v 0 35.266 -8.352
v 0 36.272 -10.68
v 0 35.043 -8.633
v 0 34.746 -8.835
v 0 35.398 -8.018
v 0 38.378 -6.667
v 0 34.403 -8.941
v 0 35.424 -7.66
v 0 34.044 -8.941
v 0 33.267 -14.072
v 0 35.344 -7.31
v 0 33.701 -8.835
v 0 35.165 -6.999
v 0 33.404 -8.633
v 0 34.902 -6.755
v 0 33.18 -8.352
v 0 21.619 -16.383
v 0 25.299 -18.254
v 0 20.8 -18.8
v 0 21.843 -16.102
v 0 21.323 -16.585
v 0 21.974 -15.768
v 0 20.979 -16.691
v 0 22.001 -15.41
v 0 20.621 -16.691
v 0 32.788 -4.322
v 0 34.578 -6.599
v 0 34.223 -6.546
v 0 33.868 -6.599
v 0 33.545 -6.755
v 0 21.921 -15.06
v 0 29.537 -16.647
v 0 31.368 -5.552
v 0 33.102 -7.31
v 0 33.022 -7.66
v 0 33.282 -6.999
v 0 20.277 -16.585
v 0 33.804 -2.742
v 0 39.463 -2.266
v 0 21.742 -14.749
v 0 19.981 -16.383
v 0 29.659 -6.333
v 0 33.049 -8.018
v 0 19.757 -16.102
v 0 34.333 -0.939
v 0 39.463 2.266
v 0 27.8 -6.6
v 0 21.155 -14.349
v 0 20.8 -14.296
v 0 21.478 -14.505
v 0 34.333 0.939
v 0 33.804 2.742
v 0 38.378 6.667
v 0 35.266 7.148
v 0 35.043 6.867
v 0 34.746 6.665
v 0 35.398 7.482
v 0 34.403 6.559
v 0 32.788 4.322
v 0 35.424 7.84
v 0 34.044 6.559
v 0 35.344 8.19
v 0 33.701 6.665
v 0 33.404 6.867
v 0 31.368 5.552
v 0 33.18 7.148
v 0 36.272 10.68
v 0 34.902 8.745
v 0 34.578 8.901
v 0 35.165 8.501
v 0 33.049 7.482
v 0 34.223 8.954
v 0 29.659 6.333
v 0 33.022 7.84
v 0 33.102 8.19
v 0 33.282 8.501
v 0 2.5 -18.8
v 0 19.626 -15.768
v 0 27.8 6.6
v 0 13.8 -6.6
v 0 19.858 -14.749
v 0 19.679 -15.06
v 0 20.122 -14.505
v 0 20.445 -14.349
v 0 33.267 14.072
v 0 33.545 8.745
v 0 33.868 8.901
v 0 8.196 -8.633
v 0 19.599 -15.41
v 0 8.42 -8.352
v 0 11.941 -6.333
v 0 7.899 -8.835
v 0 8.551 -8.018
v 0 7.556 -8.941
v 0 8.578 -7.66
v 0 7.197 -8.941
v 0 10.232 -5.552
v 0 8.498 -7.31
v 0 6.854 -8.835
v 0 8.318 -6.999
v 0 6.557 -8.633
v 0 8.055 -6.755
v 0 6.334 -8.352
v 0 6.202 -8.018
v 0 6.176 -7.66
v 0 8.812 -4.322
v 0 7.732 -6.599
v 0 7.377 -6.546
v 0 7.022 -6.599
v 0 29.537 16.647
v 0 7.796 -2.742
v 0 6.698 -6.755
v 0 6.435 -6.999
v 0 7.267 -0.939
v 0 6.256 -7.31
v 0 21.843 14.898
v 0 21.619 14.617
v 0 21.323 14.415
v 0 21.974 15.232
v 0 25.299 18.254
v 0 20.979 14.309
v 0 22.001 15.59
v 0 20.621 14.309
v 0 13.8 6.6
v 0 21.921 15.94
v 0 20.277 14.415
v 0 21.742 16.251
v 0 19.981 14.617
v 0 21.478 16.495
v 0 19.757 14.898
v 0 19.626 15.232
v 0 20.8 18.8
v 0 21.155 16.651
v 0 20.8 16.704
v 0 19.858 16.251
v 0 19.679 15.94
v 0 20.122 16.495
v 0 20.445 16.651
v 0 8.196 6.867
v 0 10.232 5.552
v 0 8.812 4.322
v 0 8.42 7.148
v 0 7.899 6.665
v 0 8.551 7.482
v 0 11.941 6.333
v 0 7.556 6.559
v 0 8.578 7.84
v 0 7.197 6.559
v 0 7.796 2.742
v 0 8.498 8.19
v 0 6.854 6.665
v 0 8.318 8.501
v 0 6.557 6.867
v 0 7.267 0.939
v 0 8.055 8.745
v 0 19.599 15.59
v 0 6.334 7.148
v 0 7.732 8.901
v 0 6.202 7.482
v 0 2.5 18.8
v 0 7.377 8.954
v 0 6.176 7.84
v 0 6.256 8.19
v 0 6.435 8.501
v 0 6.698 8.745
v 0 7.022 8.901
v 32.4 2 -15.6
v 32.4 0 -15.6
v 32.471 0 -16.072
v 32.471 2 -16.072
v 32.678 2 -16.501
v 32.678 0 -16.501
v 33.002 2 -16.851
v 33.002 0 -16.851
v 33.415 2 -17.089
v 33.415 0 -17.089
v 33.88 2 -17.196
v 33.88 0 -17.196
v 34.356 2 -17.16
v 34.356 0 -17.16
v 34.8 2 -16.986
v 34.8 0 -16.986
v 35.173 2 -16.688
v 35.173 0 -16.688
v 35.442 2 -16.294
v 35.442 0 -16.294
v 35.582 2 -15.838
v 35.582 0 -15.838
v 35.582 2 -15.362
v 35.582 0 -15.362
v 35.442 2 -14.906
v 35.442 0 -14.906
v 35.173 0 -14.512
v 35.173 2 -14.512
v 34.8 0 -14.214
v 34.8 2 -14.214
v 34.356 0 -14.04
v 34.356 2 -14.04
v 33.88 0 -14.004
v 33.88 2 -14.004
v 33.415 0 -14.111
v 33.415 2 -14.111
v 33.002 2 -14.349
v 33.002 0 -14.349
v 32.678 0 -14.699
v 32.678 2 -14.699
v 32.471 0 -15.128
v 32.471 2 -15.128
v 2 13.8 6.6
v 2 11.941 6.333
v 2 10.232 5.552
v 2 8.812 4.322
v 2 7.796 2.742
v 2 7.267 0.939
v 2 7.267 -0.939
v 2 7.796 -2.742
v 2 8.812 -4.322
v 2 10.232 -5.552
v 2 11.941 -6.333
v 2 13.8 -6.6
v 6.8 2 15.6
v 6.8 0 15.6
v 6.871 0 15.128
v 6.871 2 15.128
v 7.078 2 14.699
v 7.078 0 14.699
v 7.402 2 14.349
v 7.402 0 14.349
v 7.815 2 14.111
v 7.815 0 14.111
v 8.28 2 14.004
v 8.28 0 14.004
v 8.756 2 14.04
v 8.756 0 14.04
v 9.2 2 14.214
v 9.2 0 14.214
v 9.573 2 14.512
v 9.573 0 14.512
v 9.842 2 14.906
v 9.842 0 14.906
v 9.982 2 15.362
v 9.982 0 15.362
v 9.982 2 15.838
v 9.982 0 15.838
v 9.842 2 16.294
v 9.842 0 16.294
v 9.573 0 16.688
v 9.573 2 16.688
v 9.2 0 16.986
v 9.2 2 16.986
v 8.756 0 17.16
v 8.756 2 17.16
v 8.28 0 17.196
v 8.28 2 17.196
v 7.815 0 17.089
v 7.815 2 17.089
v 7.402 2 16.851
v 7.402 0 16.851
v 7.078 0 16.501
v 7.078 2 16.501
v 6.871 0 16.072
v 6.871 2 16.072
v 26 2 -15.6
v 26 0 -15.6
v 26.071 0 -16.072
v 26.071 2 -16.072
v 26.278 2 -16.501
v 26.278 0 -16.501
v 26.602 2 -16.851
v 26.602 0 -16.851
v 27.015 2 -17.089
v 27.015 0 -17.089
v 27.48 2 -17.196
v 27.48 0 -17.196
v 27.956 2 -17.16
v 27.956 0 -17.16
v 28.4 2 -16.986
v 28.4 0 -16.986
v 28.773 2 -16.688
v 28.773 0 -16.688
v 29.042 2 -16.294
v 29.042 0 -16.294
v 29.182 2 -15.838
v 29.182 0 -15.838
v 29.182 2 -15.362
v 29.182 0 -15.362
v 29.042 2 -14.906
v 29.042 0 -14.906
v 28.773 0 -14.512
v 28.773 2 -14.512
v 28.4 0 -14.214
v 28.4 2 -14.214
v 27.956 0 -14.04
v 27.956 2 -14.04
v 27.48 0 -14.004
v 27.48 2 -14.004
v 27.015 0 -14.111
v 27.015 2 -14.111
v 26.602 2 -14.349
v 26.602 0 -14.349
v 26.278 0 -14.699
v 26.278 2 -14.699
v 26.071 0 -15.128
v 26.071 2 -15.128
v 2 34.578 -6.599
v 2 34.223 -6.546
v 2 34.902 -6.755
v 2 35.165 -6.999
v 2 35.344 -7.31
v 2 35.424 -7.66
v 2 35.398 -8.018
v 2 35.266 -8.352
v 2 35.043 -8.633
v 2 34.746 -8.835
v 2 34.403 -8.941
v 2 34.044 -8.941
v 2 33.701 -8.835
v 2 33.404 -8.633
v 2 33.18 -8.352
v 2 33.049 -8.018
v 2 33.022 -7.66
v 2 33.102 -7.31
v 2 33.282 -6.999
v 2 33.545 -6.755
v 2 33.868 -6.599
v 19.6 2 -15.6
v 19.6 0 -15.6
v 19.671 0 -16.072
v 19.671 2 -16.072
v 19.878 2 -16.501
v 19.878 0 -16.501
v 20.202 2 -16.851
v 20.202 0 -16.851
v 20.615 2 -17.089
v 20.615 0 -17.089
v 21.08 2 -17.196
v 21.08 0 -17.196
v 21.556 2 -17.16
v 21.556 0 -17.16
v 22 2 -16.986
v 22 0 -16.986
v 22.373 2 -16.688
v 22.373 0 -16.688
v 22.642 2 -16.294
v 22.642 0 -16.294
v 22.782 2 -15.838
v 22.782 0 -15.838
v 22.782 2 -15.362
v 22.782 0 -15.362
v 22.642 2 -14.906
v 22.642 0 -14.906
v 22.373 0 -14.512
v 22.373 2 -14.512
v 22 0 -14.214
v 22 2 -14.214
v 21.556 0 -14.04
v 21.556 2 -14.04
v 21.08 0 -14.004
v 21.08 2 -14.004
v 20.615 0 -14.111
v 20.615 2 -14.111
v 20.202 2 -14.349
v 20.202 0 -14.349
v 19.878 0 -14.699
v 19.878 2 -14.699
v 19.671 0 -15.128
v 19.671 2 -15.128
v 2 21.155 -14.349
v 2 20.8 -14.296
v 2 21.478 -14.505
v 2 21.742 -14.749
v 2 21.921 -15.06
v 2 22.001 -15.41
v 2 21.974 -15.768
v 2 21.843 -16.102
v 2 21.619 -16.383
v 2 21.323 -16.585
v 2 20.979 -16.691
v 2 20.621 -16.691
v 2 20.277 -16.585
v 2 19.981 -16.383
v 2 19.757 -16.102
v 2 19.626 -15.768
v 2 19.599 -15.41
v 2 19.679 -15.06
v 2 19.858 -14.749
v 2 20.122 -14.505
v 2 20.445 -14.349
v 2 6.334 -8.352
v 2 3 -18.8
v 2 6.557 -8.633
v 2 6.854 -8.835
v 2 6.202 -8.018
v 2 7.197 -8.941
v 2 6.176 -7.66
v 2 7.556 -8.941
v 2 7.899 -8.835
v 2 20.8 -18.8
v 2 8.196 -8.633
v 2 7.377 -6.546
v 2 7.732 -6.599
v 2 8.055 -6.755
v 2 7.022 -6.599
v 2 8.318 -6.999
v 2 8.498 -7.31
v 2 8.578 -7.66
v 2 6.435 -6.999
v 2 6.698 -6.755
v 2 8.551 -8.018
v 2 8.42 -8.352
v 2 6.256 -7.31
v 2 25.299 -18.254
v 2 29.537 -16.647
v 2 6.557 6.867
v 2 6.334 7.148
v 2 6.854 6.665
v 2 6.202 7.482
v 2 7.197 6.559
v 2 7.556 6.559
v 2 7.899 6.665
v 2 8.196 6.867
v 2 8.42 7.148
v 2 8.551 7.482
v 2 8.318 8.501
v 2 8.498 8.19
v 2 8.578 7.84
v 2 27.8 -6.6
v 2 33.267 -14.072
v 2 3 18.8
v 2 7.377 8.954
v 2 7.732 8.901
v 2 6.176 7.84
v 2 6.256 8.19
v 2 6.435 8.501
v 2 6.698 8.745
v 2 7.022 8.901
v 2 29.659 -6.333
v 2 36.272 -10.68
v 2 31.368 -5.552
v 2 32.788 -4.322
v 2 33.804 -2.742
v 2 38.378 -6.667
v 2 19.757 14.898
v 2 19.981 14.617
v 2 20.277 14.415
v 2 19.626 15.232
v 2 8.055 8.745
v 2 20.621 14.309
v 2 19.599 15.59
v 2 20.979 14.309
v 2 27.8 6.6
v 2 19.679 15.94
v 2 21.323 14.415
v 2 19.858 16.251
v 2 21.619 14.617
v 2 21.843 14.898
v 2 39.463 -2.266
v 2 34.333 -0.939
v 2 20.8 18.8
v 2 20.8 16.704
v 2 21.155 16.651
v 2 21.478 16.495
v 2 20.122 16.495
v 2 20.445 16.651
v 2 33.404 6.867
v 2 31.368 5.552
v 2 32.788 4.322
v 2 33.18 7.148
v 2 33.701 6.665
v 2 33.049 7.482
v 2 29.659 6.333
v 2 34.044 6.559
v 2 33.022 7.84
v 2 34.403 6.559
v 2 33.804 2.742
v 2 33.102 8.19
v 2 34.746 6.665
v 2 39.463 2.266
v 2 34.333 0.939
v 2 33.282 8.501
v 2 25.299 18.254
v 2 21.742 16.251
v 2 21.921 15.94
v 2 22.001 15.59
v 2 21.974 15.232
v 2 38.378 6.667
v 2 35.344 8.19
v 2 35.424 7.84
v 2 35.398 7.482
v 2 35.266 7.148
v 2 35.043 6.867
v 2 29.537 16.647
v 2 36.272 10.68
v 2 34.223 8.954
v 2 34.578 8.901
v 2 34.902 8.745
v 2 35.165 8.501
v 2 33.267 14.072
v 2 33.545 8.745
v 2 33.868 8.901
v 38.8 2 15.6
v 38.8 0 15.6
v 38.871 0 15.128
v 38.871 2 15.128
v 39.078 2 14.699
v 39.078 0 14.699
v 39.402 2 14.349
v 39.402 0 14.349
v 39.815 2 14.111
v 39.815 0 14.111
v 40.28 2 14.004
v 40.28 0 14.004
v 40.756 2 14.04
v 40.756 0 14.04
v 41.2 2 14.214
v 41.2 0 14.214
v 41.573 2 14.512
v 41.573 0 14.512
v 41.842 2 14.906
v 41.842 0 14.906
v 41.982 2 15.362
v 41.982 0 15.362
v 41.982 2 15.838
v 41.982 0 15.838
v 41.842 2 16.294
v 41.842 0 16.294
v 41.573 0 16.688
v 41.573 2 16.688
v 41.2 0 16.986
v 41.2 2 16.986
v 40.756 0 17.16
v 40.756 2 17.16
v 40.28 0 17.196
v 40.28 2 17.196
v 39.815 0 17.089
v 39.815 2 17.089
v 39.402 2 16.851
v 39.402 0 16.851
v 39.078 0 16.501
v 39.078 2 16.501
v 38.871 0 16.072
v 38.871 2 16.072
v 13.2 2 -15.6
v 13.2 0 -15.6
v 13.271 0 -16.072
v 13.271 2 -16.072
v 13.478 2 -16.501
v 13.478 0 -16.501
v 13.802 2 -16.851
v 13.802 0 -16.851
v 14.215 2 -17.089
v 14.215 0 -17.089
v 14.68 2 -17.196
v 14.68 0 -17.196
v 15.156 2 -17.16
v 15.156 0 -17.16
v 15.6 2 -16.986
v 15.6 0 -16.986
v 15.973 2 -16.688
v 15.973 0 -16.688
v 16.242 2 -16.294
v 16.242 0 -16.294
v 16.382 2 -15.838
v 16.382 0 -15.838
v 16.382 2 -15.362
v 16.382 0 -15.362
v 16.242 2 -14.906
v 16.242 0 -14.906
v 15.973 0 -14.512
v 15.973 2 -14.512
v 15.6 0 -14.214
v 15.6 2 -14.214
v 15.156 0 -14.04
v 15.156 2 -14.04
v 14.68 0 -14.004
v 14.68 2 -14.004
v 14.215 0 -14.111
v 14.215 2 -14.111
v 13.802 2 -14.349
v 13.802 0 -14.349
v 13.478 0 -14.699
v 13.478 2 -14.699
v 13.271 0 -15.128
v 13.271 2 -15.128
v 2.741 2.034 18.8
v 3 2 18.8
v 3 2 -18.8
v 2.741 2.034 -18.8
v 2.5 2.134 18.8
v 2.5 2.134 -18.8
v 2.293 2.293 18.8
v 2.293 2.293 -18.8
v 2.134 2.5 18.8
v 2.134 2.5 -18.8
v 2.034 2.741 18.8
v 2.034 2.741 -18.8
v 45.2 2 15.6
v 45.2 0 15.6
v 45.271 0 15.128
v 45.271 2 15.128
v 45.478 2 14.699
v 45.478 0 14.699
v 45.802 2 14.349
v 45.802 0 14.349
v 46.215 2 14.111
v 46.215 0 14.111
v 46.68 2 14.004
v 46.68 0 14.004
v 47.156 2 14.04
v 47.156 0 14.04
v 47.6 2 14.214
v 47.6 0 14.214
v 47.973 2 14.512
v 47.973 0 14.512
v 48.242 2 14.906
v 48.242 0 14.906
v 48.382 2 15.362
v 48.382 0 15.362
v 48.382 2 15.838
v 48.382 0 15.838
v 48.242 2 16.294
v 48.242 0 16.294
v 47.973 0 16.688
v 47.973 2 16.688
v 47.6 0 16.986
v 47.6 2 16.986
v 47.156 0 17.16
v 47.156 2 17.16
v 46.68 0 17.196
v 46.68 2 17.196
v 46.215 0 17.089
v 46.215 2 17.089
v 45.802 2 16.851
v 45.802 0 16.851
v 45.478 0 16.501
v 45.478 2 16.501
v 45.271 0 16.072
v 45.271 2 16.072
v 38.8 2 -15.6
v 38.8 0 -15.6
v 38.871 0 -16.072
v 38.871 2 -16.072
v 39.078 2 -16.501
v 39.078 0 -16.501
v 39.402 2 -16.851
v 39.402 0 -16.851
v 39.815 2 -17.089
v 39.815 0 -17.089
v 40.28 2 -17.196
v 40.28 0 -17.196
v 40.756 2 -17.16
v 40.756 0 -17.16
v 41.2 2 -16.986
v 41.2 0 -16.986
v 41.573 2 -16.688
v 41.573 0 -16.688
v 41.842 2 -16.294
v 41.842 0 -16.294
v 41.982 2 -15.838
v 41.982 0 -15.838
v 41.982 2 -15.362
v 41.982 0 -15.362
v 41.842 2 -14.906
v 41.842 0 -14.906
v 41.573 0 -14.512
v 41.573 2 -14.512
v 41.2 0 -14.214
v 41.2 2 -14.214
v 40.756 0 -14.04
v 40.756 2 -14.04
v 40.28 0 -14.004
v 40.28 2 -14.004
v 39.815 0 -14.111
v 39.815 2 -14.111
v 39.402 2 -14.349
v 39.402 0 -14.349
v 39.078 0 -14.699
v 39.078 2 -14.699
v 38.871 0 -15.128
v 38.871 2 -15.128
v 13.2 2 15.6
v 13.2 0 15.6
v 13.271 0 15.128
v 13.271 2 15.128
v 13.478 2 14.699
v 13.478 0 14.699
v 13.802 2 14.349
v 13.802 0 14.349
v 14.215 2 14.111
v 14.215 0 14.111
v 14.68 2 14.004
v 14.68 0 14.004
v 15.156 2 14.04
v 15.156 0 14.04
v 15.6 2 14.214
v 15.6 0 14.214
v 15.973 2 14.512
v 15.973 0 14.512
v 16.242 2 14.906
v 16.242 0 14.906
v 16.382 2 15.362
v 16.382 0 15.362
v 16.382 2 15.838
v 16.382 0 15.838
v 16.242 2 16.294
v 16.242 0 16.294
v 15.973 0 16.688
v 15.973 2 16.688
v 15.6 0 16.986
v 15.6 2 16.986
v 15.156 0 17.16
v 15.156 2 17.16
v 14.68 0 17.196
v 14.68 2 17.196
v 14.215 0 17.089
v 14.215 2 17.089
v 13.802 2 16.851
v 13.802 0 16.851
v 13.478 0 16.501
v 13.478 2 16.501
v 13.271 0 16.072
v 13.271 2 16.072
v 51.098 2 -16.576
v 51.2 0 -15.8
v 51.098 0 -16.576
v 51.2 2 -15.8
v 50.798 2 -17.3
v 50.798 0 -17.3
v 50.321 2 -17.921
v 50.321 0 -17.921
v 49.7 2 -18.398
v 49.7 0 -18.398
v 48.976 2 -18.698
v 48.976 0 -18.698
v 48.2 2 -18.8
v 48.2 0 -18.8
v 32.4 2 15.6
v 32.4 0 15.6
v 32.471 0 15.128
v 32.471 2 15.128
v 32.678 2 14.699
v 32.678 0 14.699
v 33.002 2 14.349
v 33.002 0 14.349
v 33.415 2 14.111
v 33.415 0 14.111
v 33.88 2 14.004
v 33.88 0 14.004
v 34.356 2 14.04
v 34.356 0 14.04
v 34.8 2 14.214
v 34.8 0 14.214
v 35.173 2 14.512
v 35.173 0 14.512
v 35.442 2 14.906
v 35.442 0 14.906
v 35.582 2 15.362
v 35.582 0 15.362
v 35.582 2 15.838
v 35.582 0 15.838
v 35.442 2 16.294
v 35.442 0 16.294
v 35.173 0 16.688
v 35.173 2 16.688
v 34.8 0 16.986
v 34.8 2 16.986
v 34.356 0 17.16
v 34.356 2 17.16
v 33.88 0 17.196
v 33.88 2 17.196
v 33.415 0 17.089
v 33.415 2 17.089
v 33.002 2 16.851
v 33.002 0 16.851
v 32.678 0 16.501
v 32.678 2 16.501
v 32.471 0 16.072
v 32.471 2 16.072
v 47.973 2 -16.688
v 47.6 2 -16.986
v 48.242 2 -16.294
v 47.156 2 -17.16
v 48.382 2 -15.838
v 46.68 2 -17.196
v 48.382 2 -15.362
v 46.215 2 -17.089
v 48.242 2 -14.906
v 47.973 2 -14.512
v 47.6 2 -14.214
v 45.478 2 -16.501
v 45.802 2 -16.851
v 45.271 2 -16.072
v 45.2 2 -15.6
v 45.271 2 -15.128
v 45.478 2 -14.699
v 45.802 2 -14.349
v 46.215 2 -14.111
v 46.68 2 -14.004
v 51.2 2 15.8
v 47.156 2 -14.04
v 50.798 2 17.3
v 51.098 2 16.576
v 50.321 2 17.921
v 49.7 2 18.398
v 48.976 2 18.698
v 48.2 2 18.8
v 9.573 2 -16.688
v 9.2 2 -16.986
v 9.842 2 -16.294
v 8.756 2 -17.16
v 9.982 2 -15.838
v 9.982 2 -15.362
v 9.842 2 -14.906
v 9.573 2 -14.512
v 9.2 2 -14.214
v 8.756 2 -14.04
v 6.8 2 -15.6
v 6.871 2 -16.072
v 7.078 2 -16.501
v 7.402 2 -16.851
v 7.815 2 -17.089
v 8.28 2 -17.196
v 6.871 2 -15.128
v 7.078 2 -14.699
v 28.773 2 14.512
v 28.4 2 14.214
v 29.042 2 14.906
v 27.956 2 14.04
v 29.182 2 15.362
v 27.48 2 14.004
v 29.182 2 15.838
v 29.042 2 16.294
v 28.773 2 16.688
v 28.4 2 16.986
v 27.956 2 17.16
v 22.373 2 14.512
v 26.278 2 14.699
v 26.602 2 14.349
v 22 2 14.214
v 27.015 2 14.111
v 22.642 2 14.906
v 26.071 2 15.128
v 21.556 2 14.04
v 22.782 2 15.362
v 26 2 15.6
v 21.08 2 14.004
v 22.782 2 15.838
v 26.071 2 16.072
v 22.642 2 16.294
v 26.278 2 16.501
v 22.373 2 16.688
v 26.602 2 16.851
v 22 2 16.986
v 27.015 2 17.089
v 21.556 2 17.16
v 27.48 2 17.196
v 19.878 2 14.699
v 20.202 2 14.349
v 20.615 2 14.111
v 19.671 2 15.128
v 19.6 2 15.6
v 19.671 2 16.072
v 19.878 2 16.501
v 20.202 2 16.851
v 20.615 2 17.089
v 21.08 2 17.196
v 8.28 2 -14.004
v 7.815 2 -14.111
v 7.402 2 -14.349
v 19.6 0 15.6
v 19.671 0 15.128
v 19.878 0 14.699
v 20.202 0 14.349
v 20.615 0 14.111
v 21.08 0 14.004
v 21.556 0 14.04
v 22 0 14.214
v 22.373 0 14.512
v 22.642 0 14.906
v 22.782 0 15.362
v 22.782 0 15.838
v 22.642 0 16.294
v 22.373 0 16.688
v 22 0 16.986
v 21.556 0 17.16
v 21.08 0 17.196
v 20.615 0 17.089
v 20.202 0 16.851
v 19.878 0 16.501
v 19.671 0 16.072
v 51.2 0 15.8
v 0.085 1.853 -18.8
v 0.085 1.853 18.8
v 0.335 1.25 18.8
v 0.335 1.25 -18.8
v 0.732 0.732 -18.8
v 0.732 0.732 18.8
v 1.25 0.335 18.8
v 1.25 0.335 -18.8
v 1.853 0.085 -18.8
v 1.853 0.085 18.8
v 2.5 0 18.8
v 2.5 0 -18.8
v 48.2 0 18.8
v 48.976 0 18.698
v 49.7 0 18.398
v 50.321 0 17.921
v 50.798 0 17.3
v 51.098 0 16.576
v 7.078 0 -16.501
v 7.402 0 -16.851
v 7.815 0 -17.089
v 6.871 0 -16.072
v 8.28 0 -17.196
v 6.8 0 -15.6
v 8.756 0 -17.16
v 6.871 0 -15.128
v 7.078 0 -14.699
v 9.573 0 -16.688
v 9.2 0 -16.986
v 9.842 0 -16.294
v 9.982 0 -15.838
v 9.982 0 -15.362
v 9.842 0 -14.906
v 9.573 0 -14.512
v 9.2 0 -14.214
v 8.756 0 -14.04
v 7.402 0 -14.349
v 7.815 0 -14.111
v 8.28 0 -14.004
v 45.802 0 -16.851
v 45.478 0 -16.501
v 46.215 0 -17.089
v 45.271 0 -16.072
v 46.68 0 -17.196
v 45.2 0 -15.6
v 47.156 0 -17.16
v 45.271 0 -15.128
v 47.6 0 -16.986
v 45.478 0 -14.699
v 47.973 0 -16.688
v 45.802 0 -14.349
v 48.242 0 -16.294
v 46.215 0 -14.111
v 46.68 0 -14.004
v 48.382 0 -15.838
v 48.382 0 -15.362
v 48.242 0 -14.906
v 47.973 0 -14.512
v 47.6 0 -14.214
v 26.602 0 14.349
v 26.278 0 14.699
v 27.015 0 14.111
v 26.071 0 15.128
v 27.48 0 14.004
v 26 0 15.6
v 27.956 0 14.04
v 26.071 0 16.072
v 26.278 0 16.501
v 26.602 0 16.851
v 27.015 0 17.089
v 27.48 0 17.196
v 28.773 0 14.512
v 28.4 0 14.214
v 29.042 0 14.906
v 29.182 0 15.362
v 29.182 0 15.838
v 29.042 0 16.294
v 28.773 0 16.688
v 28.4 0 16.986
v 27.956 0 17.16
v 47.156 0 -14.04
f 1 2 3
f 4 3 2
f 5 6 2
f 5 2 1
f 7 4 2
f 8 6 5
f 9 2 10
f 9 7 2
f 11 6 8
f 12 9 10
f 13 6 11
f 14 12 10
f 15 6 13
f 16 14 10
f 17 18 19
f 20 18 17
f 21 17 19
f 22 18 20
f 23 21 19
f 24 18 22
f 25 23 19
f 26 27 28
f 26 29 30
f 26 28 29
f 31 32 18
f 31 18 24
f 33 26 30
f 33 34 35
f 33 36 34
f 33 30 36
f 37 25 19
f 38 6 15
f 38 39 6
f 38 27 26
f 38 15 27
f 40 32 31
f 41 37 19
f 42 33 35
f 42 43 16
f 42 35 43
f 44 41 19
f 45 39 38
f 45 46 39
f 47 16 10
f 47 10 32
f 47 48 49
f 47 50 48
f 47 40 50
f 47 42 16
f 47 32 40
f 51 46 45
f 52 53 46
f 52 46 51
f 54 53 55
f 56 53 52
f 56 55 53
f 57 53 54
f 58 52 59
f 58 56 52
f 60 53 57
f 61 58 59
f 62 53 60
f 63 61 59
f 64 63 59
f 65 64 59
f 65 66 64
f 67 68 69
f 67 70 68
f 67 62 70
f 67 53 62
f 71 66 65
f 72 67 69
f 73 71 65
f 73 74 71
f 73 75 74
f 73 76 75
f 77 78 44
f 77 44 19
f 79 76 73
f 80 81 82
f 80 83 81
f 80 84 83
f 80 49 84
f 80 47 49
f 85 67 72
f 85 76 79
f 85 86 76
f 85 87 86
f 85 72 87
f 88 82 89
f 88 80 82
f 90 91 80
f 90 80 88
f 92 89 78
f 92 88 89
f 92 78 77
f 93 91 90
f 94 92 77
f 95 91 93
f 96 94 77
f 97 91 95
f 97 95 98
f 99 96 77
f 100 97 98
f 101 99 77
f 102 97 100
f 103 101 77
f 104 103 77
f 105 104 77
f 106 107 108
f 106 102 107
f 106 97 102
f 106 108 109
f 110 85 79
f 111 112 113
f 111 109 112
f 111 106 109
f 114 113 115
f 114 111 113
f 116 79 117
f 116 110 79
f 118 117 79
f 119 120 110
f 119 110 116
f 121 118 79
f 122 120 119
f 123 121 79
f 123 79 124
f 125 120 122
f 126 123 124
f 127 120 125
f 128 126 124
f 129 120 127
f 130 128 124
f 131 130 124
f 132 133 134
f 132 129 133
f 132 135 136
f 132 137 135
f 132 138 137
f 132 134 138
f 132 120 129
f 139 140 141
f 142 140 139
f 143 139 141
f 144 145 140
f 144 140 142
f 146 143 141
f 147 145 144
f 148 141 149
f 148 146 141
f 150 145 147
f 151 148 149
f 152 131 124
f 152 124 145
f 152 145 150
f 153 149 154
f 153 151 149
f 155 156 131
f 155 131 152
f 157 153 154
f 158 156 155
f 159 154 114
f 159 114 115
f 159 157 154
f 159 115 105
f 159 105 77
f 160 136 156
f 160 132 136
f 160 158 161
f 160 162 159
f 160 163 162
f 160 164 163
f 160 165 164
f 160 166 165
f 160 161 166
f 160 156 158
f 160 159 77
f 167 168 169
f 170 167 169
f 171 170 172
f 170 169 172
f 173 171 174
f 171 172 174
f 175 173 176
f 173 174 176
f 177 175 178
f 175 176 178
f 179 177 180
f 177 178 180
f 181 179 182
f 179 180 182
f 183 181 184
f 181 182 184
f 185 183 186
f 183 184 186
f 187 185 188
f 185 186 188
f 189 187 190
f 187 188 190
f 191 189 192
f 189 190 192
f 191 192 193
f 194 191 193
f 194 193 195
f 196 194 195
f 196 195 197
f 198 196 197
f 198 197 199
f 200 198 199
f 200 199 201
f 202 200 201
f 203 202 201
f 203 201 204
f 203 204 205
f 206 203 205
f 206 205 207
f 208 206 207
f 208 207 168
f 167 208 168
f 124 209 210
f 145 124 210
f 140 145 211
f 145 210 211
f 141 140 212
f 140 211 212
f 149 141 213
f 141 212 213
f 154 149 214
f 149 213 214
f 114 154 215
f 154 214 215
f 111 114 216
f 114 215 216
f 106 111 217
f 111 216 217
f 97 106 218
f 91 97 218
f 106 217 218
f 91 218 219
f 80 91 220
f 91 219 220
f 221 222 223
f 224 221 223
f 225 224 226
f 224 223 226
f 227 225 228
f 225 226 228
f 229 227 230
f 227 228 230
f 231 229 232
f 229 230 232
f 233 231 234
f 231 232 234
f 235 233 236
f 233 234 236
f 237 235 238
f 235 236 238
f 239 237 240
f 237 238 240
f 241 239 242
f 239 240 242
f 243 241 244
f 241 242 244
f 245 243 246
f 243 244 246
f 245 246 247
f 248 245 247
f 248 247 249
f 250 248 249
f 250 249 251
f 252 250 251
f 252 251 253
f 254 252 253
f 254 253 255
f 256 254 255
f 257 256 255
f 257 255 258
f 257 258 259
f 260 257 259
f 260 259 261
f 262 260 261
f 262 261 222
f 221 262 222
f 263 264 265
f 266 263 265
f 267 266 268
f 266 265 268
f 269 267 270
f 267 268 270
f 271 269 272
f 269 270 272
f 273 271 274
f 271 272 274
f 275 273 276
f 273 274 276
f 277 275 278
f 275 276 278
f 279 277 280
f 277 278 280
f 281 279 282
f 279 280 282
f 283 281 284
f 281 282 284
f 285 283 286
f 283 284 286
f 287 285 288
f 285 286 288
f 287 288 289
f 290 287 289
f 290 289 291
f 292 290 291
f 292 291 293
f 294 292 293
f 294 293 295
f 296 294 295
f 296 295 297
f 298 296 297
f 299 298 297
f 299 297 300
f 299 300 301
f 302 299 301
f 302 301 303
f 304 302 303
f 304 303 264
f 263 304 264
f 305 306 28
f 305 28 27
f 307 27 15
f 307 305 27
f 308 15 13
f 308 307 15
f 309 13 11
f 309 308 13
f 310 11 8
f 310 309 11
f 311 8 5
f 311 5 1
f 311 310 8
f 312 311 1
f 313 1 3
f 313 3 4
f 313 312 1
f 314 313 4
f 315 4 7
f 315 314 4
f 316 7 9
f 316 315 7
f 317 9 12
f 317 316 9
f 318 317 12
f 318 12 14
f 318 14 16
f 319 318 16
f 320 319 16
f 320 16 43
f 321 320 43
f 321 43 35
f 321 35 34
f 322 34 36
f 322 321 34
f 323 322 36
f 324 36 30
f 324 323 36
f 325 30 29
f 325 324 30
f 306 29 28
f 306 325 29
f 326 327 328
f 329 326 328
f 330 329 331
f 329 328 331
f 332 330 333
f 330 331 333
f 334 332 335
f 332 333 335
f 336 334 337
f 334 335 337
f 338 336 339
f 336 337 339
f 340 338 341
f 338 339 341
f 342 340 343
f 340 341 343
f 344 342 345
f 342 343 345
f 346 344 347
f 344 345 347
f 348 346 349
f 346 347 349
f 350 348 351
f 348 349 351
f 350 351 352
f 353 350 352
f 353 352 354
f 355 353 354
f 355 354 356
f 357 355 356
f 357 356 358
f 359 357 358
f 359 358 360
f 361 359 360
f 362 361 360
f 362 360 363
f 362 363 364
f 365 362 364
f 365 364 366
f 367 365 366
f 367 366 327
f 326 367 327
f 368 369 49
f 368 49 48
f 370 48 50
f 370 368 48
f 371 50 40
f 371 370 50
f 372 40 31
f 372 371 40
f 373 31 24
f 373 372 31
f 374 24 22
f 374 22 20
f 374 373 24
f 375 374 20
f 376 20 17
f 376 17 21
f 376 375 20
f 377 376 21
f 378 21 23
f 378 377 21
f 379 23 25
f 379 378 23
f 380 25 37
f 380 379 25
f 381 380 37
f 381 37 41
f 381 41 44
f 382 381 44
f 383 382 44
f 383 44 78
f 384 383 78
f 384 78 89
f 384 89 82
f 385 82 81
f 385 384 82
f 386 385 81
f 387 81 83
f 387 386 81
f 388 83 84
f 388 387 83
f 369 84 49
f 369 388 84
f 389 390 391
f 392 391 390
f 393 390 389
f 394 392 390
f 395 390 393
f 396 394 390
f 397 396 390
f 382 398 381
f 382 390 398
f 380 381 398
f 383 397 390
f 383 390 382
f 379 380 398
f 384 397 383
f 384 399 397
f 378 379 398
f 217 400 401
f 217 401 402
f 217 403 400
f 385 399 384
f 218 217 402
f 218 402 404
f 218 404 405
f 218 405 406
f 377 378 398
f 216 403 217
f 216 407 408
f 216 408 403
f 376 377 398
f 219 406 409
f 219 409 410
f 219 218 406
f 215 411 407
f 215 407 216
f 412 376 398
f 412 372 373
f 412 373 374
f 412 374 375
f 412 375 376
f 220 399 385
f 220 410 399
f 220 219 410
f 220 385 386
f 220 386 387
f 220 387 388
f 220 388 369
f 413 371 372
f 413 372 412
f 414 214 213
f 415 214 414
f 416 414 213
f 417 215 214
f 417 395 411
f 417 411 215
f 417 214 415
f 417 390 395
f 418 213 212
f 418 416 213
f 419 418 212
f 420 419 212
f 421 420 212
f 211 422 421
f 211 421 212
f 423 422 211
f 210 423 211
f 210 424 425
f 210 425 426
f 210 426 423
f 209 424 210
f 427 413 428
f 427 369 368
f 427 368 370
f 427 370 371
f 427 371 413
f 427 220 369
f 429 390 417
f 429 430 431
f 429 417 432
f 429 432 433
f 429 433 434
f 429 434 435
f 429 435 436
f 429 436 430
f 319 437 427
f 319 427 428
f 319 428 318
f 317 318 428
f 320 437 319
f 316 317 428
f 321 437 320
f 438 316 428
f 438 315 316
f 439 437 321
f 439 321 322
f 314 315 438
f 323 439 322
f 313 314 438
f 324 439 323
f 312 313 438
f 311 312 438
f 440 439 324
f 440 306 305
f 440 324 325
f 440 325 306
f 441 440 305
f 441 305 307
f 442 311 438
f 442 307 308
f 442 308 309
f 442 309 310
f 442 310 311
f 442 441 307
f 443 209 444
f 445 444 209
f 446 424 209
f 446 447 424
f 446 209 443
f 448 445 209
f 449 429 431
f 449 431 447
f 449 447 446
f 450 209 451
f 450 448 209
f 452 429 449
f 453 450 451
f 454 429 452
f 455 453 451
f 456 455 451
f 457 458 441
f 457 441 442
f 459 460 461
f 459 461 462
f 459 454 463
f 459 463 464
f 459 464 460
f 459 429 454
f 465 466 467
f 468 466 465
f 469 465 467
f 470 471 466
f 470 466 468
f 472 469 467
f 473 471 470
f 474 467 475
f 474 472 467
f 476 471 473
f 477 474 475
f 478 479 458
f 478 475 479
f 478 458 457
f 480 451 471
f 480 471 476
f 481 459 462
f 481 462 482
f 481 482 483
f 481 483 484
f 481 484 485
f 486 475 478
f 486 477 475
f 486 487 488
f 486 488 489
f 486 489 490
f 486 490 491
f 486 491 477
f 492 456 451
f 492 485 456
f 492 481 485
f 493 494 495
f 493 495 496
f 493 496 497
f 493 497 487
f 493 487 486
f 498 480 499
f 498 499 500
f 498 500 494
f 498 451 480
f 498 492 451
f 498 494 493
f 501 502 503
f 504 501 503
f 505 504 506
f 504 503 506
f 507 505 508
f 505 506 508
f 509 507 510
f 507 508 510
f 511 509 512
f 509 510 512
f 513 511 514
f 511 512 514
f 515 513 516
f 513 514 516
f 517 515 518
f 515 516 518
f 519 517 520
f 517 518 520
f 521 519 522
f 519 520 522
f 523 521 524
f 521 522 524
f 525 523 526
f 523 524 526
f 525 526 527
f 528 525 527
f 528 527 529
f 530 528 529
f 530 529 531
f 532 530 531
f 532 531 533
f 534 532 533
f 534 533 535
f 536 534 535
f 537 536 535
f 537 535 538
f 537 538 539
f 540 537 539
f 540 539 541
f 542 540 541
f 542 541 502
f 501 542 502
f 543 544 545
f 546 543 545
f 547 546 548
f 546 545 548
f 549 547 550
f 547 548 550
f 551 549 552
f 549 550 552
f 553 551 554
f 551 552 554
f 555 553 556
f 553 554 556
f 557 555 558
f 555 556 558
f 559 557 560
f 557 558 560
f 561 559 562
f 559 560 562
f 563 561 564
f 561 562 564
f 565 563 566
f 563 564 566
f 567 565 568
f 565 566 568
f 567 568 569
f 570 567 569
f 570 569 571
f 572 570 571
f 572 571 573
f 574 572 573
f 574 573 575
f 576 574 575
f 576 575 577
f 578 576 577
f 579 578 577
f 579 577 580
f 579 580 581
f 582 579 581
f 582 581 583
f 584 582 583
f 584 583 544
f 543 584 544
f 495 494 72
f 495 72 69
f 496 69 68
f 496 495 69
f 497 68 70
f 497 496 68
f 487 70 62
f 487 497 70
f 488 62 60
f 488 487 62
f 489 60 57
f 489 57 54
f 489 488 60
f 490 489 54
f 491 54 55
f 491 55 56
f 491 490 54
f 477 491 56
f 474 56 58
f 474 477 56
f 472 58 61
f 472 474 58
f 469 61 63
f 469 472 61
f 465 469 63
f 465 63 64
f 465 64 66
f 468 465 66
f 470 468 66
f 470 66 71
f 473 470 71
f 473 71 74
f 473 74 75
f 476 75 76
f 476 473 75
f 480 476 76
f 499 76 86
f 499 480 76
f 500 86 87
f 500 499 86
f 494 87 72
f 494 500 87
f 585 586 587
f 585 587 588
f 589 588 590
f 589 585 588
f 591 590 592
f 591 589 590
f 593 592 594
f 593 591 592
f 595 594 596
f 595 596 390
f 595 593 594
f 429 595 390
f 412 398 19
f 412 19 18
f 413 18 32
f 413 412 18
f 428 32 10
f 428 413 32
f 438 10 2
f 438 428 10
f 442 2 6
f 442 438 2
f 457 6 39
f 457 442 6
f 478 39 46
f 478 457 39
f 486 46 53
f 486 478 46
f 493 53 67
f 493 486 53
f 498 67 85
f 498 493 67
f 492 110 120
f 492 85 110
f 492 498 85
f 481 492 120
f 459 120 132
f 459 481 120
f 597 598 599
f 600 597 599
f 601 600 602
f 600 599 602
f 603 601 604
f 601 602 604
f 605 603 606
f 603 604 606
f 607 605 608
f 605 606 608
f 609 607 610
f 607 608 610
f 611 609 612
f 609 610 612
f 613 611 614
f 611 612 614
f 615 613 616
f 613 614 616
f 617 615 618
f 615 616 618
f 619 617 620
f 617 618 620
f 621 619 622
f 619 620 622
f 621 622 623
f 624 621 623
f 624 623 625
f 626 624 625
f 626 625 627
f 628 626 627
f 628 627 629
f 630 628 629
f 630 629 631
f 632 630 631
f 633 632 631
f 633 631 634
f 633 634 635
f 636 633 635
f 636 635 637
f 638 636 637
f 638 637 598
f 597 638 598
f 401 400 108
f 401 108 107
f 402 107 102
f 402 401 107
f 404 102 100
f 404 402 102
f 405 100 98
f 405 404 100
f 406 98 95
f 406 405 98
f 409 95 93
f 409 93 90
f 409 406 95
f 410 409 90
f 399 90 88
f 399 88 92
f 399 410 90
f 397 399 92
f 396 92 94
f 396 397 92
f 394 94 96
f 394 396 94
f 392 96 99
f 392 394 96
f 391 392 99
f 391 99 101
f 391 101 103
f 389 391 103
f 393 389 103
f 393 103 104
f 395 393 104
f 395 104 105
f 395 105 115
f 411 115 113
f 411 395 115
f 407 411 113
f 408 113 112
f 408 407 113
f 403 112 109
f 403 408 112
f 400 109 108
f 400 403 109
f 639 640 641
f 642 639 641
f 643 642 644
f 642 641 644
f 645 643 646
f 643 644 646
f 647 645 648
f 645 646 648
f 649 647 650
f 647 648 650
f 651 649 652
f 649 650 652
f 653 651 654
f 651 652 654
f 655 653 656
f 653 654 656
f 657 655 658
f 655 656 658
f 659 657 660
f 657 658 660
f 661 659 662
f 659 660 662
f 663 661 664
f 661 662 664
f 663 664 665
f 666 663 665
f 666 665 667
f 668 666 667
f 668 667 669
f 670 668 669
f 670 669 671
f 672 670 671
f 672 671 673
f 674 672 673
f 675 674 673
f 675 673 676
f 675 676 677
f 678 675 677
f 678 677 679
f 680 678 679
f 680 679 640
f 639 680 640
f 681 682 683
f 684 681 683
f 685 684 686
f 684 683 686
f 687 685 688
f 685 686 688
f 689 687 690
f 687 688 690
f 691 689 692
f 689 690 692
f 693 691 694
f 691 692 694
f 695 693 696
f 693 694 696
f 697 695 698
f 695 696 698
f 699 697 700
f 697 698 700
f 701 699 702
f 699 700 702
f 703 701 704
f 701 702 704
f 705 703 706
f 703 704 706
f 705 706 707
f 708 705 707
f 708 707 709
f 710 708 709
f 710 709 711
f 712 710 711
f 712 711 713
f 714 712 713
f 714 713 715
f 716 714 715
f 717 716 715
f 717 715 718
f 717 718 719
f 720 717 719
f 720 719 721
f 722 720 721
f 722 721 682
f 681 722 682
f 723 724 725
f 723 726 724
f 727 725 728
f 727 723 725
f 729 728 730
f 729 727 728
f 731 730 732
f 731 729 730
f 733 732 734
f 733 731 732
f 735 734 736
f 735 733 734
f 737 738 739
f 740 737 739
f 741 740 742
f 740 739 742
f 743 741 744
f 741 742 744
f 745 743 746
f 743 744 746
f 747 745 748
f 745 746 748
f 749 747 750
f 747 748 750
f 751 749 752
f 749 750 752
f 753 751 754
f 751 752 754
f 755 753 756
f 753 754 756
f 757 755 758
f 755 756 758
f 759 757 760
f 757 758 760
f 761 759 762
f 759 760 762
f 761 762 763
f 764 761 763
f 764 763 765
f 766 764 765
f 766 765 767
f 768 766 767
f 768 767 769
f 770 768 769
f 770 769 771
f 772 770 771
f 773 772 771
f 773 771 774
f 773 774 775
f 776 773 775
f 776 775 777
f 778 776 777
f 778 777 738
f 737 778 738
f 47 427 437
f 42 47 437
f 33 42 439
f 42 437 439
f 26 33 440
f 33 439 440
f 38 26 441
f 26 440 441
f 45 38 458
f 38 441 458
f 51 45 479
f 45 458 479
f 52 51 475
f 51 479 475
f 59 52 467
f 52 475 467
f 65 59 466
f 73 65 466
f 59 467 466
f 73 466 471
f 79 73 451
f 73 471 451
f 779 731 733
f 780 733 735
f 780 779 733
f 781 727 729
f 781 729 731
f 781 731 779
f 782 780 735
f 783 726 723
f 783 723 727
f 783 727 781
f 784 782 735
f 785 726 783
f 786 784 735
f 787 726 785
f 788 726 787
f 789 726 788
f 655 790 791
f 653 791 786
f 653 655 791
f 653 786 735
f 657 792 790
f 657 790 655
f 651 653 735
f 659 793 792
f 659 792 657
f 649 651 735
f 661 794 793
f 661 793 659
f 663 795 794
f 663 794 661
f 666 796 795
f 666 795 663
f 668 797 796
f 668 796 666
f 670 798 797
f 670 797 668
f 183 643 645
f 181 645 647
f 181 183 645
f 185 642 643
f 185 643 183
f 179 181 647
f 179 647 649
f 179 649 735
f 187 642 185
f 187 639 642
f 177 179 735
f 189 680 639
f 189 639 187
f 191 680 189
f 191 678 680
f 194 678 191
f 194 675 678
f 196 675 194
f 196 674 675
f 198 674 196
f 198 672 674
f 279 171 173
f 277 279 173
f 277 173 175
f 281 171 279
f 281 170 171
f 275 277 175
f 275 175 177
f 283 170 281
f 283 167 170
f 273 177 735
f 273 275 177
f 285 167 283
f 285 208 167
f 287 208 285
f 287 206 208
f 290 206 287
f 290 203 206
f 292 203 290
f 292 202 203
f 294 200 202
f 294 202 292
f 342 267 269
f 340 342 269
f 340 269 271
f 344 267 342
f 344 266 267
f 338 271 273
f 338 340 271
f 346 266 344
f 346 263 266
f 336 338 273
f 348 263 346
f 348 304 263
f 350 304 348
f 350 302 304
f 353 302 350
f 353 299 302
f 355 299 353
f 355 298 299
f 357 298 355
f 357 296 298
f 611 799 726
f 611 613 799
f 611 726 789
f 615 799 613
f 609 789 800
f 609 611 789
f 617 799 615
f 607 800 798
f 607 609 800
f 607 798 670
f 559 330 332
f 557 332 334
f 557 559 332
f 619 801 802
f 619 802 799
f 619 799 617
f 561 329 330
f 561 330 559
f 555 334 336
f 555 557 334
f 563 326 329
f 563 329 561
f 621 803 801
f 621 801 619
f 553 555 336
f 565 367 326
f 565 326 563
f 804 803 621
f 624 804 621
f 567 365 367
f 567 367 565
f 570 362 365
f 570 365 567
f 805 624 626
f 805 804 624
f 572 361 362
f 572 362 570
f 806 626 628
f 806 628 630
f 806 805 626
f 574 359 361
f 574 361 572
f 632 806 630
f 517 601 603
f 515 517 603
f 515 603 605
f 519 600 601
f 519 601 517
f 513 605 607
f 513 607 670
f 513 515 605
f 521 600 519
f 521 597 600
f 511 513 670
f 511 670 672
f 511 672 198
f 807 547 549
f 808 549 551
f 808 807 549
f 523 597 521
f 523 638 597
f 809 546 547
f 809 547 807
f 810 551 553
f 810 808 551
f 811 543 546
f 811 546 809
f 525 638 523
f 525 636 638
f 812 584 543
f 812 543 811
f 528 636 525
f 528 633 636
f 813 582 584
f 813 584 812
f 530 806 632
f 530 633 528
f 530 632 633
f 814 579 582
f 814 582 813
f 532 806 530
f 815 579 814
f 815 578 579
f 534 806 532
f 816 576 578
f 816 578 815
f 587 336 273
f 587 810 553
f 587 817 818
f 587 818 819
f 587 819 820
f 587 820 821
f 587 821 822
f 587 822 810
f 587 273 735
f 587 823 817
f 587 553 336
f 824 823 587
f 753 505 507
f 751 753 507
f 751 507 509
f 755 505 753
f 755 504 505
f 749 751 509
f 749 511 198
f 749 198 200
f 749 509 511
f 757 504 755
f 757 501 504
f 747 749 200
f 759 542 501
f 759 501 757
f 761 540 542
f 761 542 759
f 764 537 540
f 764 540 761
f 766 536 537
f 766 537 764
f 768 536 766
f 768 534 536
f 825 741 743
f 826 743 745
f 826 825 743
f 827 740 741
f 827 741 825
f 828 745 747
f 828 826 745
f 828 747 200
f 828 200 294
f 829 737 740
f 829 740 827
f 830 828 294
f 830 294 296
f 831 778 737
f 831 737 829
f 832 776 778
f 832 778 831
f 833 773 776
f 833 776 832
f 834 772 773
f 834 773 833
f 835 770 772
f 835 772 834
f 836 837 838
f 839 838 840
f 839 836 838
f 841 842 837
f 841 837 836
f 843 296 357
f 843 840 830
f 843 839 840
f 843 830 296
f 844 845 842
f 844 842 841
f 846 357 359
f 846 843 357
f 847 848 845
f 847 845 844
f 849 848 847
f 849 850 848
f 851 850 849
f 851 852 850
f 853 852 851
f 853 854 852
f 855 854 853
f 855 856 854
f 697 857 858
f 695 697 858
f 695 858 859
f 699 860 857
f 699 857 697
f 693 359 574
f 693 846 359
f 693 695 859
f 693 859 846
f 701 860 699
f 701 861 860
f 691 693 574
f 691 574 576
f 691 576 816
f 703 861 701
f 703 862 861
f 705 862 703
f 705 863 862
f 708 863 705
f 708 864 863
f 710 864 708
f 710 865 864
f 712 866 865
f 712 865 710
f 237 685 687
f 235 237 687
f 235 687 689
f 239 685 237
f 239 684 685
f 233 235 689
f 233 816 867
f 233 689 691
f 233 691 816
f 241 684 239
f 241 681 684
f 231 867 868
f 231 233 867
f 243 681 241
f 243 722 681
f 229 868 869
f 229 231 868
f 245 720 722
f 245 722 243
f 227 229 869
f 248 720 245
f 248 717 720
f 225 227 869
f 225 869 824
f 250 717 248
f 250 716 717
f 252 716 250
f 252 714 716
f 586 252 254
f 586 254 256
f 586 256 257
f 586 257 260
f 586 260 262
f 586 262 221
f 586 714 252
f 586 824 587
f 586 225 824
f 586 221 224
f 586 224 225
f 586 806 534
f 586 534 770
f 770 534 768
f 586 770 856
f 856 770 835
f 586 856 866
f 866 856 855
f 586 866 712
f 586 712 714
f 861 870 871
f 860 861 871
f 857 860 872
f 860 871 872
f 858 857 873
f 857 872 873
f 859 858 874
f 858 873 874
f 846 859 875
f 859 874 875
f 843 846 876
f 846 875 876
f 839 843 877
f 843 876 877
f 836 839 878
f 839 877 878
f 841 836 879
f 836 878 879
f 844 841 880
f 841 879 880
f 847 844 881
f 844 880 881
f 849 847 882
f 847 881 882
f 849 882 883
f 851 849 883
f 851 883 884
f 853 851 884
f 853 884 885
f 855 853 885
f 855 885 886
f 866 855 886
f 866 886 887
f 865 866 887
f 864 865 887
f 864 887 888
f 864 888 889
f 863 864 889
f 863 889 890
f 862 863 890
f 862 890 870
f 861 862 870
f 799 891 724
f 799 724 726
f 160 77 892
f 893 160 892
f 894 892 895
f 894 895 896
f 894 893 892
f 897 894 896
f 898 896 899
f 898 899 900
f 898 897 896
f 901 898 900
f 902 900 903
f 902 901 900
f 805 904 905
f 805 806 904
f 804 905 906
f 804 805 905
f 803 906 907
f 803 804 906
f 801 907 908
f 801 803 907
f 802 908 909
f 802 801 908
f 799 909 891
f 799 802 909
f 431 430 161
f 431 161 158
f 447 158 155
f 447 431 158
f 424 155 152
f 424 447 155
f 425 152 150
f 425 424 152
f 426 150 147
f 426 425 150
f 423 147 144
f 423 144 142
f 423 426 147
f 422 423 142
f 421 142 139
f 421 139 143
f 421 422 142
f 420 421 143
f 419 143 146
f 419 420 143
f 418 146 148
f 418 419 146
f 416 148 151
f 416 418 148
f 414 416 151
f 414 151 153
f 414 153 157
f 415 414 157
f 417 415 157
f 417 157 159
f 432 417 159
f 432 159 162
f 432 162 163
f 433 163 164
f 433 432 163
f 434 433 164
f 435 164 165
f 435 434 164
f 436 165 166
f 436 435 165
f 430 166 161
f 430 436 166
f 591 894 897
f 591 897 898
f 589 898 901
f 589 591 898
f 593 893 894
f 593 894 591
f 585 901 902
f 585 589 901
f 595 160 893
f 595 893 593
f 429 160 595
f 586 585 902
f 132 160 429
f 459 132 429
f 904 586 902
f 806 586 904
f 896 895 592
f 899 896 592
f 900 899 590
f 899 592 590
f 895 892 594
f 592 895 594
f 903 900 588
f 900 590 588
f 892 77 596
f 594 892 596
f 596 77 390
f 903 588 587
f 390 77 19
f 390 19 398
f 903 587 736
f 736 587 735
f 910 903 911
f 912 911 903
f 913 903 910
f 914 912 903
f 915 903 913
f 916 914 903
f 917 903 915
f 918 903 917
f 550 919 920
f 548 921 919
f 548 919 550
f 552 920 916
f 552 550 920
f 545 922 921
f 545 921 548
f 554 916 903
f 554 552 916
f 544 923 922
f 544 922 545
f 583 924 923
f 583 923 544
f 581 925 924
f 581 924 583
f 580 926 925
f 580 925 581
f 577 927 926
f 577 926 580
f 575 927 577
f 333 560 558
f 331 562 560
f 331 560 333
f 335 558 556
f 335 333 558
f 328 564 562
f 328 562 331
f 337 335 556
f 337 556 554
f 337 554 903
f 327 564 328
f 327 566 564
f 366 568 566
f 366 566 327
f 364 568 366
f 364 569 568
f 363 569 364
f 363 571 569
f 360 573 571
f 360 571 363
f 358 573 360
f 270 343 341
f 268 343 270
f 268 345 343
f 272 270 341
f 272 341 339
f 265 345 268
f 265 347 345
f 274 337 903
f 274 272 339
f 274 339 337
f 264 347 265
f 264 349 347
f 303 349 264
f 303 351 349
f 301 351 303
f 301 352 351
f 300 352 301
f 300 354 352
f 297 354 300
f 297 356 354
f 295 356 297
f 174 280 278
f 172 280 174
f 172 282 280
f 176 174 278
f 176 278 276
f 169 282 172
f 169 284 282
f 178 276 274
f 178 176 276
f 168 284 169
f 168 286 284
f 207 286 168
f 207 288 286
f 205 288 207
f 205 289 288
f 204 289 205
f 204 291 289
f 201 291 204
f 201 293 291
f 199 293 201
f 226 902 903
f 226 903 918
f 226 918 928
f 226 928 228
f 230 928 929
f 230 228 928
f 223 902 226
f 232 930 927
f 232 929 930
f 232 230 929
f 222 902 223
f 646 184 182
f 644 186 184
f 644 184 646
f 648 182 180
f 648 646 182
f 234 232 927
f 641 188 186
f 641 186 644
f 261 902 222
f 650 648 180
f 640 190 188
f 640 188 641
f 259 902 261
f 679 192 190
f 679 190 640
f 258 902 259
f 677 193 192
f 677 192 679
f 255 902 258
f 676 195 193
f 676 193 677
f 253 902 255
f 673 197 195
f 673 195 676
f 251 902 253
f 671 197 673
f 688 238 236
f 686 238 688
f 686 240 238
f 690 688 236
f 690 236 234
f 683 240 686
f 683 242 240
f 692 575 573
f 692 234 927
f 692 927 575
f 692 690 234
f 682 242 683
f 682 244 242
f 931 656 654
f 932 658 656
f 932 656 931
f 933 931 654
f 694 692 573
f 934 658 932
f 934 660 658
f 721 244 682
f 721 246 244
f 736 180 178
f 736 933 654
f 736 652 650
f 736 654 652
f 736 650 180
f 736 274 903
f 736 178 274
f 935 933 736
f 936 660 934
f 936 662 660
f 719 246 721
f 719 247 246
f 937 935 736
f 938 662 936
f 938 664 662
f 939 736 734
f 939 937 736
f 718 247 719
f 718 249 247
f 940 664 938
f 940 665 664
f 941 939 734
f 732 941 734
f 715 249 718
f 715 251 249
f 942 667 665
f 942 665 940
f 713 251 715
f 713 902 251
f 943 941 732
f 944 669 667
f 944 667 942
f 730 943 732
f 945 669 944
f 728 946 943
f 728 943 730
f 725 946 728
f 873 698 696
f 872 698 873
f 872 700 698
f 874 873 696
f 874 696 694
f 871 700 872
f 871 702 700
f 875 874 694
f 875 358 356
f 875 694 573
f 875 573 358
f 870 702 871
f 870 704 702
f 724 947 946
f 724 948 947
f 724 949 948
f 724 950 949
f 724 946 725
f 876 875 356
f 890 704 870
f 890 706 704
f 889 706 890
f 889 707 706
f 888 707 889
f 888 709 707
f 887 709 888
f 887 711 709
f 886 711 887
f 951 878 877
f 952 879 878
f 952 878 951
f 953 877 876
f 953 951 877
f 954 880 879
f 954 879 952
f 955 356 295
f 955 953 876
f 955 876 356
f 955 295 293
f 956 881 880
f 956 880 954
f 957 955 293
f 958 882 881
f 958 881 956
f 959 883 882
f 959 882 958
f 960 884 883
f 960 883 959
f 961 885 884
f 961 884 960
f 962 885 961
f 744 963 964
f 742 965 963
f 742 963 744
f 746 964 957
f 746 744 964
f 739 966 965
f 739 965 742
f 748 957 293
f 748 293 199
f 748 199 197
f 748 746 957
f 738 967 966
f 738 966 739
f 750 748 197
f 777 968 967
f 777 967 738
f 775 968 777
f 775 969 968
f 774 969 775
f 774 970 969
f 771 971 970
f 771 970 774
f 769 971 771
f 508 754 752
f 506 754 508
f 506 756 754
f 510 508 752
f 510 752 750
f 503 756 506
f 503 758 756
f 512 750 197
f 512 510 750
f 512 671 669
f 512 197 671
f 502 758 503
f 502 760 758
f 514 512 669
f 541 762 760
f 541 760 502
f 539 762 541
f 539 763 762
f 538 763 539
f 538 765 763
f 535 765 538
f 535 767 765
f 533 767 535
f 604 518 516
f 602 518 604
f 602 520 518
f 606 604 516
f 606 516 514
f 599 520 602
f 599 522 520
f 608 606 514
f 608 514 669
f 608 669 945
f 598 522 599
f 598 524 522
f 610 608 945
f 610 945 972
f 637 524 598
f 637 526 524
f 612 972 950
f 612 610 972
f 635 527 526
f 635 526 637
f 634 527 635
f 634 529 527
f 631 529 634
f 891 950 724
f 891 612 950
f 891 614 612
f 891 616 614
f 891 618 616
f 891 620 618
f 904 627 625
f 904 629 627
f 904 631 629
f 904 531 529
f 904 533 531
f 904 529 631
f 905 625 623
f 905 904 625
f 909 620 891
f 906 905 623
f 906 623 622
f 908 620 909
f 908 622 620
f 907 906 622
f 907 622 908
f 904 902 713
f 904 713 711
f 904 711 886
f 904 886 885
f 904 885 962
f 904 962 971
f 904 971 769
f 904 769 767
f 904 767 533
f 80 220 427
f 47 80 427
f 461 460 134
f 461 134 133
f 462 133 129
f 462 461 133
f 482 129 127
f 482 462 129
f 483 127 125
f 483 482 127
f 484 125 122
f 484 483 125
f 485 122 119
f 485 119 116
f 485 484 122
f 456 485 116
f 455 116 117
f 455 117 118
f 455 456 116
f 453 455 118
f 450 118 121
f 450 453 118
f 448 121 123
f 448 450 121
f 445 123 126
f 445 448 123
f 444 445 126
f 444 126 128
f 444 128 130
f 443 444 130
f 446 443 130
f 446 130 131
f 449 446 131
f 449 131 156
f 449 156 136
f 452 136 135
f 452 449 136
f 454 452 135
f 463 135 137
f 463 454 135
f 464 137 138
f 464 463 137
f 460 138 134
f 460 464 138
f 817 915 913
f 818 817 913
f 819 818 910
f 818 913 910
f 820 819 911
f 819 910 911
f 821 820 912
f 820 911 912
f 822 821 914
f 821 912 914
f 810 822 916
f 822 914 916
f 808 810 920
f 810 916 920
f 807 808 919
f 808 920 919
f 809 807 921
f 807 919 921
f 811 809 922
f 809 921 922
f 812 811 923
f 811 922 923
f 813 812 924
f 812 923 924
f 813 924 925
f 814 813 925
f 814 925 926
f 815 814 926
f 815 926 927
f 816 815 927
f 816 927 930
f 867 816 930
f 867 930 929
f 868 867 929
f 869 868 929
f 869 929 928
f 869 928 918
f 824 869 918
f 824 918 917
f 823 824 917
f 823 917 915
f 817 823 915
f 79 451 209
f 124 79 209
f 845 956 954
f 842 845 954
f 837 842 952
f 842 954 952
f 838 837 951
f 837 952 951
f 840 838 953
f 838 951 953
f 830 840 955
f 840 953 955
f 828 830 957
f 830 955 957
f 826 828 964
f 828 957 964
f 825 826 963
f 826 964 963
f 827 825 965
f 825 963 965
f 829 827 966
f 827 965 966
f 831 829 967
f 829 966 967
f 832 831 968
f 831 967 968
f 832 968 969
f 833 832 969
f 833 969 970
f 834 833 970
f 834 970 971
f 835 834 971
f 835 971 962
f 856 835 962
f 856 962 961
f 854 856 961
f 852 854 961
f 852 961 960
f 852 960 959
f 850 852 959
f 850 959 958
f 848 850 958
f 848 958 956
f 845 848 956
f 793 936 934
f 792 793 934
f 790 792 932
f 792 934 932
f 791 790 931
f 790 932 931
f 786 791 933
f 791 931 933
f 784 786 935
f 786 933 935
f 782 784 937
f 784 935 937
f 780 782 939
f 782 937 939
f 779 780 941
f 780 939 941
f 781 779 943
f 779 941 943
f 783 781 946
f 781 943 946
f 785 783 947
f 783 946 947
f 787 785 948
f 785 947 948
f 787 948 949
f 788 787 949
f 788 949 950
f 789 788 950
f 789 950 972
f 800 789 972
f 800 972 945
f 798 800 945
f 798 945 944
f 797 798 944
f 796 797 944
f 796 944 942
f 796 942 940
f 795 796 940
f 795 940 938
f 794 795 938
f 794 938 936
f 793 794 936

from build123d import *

# Parameters (mm, degrees)
BOSS_EXTRUDE1_DEPTH            = 18.8
CUT_EXTRUDE1_START             = -2
SKETCH2_R                      = 1.204354552
CUT_EXTRUDE1_DEPTH             = 2
FILLET1_R                      = 3
F_3_2_3_2_DIAMETER_HOLE1_D     = 3.2
F_3_2_3_2_DIAMETER_HOLE1_DEPTH = 2


with BuildPart() as part:
    # Sketch1 → Boss-Extrude1 (new body, symmetric)
    with BuildSketch(Plane.XY):
        with BuildLine():
            Line((2.5, 0), (51.2, 0))
            Line((51.2, 0), (51.2, 2))
            Line((51.2, 2), (3, 2))
            ThreePointArc((3, 2), (2.292893219, 2.292893219), (2, 3))
            Line((2, 3), (2, 39.6))
            Line((2, 39.6), (0, 39.6))
            Line((0, 39.6), (0, 2.5))
            ThreePointArc((0, 2.5), (0.732233047, 0.732233047), (2.5, 0))
        make_face()
    extrude(amount=BOSS_EXTRUDE1_DEPTH, both=True)

    # Sketch2 → Cut-Extrude1 (cut)
    with BuildSketch(Plane.ZY.offset(CUT_EXTRUDE1_START)):
        with Locations((15.5, 20.8)):
            Circle(SKETCH2_R)
        with Locations((7.75, 7.376606241)):
            Circle(SKETCH2_R)
        with Locations((-7.75, 7.376606241)):
            Circle(SKETCH2_R)
        with Locations((-15.5, 20.8)):
            Circle(SKETCH2_R)
        with Locations((-7.75, 34.223393759)):
            Circle(SKETCH2_R)
        with Locations((7.75, 34.223393759)):
            Circle(SKETCH2_R)
        with BuildLine():
            Line((6.6, 27.8), (6.6, 13.8))
            ThreePointArc((6.6, 13.8), (0, 7.2), (-6.6, 13.8))
            Line((-6.6, 13.8), (-6.6, 27.8))
            ThreePointArc((-6.6, 27.8), (0, 34.4), (6.6, 27.8))
        make_face()
        with BuildLine():
            Line((-18.8, 40.1), (-18.8, 20.8))
            ThreePointArc((-18.8, 20.8), (0, 39.6), (18.8, 20.8))
            Line((18.8, 20.8), (18.8, 40.1))
            Line((18.8, 40.1), (-18.8, 40.1))
        make_face()
    extrude(amount=CUT_EXTRUDE1_DEPTH, mode=Mode.SUBTRACT)

    # Fillet1
    fillet1_edges = [part.edges().sort_by_distance(p)[0] for p in [
        (51.2, 1, -18.8),
        (51.2, 1, 18.8),
    ]]
    fillet(fillet1_edges, radius=FILLET1_R)

    # Ø3.2 (3.2) Diameter Hole1
    with Locations(Plane(origin=(0, 2, 0), x_dir=(1, 0, 0), z_dir=(0, 1, 0))):
        with Locations((8.4, 15.6), (8.4, -15.6), (14.8, 15.6), (14.8, -15.6), (21.2, 15.6), (21.2, -15.6), (27.6, 15.6), (27.6, -15.6), (34, 15.6), (34, -15.6), (40.4, 15.6), (40.4, -15.6), (46.8, 15.6), (46.8, -15.6)):
            Hole(F_3_2_3_2_DIAMETER_HOLE1_D / 2, depth=F_3_2_3_2_DIAMETER_HOLE1_DEPTH)


solid = part.part
